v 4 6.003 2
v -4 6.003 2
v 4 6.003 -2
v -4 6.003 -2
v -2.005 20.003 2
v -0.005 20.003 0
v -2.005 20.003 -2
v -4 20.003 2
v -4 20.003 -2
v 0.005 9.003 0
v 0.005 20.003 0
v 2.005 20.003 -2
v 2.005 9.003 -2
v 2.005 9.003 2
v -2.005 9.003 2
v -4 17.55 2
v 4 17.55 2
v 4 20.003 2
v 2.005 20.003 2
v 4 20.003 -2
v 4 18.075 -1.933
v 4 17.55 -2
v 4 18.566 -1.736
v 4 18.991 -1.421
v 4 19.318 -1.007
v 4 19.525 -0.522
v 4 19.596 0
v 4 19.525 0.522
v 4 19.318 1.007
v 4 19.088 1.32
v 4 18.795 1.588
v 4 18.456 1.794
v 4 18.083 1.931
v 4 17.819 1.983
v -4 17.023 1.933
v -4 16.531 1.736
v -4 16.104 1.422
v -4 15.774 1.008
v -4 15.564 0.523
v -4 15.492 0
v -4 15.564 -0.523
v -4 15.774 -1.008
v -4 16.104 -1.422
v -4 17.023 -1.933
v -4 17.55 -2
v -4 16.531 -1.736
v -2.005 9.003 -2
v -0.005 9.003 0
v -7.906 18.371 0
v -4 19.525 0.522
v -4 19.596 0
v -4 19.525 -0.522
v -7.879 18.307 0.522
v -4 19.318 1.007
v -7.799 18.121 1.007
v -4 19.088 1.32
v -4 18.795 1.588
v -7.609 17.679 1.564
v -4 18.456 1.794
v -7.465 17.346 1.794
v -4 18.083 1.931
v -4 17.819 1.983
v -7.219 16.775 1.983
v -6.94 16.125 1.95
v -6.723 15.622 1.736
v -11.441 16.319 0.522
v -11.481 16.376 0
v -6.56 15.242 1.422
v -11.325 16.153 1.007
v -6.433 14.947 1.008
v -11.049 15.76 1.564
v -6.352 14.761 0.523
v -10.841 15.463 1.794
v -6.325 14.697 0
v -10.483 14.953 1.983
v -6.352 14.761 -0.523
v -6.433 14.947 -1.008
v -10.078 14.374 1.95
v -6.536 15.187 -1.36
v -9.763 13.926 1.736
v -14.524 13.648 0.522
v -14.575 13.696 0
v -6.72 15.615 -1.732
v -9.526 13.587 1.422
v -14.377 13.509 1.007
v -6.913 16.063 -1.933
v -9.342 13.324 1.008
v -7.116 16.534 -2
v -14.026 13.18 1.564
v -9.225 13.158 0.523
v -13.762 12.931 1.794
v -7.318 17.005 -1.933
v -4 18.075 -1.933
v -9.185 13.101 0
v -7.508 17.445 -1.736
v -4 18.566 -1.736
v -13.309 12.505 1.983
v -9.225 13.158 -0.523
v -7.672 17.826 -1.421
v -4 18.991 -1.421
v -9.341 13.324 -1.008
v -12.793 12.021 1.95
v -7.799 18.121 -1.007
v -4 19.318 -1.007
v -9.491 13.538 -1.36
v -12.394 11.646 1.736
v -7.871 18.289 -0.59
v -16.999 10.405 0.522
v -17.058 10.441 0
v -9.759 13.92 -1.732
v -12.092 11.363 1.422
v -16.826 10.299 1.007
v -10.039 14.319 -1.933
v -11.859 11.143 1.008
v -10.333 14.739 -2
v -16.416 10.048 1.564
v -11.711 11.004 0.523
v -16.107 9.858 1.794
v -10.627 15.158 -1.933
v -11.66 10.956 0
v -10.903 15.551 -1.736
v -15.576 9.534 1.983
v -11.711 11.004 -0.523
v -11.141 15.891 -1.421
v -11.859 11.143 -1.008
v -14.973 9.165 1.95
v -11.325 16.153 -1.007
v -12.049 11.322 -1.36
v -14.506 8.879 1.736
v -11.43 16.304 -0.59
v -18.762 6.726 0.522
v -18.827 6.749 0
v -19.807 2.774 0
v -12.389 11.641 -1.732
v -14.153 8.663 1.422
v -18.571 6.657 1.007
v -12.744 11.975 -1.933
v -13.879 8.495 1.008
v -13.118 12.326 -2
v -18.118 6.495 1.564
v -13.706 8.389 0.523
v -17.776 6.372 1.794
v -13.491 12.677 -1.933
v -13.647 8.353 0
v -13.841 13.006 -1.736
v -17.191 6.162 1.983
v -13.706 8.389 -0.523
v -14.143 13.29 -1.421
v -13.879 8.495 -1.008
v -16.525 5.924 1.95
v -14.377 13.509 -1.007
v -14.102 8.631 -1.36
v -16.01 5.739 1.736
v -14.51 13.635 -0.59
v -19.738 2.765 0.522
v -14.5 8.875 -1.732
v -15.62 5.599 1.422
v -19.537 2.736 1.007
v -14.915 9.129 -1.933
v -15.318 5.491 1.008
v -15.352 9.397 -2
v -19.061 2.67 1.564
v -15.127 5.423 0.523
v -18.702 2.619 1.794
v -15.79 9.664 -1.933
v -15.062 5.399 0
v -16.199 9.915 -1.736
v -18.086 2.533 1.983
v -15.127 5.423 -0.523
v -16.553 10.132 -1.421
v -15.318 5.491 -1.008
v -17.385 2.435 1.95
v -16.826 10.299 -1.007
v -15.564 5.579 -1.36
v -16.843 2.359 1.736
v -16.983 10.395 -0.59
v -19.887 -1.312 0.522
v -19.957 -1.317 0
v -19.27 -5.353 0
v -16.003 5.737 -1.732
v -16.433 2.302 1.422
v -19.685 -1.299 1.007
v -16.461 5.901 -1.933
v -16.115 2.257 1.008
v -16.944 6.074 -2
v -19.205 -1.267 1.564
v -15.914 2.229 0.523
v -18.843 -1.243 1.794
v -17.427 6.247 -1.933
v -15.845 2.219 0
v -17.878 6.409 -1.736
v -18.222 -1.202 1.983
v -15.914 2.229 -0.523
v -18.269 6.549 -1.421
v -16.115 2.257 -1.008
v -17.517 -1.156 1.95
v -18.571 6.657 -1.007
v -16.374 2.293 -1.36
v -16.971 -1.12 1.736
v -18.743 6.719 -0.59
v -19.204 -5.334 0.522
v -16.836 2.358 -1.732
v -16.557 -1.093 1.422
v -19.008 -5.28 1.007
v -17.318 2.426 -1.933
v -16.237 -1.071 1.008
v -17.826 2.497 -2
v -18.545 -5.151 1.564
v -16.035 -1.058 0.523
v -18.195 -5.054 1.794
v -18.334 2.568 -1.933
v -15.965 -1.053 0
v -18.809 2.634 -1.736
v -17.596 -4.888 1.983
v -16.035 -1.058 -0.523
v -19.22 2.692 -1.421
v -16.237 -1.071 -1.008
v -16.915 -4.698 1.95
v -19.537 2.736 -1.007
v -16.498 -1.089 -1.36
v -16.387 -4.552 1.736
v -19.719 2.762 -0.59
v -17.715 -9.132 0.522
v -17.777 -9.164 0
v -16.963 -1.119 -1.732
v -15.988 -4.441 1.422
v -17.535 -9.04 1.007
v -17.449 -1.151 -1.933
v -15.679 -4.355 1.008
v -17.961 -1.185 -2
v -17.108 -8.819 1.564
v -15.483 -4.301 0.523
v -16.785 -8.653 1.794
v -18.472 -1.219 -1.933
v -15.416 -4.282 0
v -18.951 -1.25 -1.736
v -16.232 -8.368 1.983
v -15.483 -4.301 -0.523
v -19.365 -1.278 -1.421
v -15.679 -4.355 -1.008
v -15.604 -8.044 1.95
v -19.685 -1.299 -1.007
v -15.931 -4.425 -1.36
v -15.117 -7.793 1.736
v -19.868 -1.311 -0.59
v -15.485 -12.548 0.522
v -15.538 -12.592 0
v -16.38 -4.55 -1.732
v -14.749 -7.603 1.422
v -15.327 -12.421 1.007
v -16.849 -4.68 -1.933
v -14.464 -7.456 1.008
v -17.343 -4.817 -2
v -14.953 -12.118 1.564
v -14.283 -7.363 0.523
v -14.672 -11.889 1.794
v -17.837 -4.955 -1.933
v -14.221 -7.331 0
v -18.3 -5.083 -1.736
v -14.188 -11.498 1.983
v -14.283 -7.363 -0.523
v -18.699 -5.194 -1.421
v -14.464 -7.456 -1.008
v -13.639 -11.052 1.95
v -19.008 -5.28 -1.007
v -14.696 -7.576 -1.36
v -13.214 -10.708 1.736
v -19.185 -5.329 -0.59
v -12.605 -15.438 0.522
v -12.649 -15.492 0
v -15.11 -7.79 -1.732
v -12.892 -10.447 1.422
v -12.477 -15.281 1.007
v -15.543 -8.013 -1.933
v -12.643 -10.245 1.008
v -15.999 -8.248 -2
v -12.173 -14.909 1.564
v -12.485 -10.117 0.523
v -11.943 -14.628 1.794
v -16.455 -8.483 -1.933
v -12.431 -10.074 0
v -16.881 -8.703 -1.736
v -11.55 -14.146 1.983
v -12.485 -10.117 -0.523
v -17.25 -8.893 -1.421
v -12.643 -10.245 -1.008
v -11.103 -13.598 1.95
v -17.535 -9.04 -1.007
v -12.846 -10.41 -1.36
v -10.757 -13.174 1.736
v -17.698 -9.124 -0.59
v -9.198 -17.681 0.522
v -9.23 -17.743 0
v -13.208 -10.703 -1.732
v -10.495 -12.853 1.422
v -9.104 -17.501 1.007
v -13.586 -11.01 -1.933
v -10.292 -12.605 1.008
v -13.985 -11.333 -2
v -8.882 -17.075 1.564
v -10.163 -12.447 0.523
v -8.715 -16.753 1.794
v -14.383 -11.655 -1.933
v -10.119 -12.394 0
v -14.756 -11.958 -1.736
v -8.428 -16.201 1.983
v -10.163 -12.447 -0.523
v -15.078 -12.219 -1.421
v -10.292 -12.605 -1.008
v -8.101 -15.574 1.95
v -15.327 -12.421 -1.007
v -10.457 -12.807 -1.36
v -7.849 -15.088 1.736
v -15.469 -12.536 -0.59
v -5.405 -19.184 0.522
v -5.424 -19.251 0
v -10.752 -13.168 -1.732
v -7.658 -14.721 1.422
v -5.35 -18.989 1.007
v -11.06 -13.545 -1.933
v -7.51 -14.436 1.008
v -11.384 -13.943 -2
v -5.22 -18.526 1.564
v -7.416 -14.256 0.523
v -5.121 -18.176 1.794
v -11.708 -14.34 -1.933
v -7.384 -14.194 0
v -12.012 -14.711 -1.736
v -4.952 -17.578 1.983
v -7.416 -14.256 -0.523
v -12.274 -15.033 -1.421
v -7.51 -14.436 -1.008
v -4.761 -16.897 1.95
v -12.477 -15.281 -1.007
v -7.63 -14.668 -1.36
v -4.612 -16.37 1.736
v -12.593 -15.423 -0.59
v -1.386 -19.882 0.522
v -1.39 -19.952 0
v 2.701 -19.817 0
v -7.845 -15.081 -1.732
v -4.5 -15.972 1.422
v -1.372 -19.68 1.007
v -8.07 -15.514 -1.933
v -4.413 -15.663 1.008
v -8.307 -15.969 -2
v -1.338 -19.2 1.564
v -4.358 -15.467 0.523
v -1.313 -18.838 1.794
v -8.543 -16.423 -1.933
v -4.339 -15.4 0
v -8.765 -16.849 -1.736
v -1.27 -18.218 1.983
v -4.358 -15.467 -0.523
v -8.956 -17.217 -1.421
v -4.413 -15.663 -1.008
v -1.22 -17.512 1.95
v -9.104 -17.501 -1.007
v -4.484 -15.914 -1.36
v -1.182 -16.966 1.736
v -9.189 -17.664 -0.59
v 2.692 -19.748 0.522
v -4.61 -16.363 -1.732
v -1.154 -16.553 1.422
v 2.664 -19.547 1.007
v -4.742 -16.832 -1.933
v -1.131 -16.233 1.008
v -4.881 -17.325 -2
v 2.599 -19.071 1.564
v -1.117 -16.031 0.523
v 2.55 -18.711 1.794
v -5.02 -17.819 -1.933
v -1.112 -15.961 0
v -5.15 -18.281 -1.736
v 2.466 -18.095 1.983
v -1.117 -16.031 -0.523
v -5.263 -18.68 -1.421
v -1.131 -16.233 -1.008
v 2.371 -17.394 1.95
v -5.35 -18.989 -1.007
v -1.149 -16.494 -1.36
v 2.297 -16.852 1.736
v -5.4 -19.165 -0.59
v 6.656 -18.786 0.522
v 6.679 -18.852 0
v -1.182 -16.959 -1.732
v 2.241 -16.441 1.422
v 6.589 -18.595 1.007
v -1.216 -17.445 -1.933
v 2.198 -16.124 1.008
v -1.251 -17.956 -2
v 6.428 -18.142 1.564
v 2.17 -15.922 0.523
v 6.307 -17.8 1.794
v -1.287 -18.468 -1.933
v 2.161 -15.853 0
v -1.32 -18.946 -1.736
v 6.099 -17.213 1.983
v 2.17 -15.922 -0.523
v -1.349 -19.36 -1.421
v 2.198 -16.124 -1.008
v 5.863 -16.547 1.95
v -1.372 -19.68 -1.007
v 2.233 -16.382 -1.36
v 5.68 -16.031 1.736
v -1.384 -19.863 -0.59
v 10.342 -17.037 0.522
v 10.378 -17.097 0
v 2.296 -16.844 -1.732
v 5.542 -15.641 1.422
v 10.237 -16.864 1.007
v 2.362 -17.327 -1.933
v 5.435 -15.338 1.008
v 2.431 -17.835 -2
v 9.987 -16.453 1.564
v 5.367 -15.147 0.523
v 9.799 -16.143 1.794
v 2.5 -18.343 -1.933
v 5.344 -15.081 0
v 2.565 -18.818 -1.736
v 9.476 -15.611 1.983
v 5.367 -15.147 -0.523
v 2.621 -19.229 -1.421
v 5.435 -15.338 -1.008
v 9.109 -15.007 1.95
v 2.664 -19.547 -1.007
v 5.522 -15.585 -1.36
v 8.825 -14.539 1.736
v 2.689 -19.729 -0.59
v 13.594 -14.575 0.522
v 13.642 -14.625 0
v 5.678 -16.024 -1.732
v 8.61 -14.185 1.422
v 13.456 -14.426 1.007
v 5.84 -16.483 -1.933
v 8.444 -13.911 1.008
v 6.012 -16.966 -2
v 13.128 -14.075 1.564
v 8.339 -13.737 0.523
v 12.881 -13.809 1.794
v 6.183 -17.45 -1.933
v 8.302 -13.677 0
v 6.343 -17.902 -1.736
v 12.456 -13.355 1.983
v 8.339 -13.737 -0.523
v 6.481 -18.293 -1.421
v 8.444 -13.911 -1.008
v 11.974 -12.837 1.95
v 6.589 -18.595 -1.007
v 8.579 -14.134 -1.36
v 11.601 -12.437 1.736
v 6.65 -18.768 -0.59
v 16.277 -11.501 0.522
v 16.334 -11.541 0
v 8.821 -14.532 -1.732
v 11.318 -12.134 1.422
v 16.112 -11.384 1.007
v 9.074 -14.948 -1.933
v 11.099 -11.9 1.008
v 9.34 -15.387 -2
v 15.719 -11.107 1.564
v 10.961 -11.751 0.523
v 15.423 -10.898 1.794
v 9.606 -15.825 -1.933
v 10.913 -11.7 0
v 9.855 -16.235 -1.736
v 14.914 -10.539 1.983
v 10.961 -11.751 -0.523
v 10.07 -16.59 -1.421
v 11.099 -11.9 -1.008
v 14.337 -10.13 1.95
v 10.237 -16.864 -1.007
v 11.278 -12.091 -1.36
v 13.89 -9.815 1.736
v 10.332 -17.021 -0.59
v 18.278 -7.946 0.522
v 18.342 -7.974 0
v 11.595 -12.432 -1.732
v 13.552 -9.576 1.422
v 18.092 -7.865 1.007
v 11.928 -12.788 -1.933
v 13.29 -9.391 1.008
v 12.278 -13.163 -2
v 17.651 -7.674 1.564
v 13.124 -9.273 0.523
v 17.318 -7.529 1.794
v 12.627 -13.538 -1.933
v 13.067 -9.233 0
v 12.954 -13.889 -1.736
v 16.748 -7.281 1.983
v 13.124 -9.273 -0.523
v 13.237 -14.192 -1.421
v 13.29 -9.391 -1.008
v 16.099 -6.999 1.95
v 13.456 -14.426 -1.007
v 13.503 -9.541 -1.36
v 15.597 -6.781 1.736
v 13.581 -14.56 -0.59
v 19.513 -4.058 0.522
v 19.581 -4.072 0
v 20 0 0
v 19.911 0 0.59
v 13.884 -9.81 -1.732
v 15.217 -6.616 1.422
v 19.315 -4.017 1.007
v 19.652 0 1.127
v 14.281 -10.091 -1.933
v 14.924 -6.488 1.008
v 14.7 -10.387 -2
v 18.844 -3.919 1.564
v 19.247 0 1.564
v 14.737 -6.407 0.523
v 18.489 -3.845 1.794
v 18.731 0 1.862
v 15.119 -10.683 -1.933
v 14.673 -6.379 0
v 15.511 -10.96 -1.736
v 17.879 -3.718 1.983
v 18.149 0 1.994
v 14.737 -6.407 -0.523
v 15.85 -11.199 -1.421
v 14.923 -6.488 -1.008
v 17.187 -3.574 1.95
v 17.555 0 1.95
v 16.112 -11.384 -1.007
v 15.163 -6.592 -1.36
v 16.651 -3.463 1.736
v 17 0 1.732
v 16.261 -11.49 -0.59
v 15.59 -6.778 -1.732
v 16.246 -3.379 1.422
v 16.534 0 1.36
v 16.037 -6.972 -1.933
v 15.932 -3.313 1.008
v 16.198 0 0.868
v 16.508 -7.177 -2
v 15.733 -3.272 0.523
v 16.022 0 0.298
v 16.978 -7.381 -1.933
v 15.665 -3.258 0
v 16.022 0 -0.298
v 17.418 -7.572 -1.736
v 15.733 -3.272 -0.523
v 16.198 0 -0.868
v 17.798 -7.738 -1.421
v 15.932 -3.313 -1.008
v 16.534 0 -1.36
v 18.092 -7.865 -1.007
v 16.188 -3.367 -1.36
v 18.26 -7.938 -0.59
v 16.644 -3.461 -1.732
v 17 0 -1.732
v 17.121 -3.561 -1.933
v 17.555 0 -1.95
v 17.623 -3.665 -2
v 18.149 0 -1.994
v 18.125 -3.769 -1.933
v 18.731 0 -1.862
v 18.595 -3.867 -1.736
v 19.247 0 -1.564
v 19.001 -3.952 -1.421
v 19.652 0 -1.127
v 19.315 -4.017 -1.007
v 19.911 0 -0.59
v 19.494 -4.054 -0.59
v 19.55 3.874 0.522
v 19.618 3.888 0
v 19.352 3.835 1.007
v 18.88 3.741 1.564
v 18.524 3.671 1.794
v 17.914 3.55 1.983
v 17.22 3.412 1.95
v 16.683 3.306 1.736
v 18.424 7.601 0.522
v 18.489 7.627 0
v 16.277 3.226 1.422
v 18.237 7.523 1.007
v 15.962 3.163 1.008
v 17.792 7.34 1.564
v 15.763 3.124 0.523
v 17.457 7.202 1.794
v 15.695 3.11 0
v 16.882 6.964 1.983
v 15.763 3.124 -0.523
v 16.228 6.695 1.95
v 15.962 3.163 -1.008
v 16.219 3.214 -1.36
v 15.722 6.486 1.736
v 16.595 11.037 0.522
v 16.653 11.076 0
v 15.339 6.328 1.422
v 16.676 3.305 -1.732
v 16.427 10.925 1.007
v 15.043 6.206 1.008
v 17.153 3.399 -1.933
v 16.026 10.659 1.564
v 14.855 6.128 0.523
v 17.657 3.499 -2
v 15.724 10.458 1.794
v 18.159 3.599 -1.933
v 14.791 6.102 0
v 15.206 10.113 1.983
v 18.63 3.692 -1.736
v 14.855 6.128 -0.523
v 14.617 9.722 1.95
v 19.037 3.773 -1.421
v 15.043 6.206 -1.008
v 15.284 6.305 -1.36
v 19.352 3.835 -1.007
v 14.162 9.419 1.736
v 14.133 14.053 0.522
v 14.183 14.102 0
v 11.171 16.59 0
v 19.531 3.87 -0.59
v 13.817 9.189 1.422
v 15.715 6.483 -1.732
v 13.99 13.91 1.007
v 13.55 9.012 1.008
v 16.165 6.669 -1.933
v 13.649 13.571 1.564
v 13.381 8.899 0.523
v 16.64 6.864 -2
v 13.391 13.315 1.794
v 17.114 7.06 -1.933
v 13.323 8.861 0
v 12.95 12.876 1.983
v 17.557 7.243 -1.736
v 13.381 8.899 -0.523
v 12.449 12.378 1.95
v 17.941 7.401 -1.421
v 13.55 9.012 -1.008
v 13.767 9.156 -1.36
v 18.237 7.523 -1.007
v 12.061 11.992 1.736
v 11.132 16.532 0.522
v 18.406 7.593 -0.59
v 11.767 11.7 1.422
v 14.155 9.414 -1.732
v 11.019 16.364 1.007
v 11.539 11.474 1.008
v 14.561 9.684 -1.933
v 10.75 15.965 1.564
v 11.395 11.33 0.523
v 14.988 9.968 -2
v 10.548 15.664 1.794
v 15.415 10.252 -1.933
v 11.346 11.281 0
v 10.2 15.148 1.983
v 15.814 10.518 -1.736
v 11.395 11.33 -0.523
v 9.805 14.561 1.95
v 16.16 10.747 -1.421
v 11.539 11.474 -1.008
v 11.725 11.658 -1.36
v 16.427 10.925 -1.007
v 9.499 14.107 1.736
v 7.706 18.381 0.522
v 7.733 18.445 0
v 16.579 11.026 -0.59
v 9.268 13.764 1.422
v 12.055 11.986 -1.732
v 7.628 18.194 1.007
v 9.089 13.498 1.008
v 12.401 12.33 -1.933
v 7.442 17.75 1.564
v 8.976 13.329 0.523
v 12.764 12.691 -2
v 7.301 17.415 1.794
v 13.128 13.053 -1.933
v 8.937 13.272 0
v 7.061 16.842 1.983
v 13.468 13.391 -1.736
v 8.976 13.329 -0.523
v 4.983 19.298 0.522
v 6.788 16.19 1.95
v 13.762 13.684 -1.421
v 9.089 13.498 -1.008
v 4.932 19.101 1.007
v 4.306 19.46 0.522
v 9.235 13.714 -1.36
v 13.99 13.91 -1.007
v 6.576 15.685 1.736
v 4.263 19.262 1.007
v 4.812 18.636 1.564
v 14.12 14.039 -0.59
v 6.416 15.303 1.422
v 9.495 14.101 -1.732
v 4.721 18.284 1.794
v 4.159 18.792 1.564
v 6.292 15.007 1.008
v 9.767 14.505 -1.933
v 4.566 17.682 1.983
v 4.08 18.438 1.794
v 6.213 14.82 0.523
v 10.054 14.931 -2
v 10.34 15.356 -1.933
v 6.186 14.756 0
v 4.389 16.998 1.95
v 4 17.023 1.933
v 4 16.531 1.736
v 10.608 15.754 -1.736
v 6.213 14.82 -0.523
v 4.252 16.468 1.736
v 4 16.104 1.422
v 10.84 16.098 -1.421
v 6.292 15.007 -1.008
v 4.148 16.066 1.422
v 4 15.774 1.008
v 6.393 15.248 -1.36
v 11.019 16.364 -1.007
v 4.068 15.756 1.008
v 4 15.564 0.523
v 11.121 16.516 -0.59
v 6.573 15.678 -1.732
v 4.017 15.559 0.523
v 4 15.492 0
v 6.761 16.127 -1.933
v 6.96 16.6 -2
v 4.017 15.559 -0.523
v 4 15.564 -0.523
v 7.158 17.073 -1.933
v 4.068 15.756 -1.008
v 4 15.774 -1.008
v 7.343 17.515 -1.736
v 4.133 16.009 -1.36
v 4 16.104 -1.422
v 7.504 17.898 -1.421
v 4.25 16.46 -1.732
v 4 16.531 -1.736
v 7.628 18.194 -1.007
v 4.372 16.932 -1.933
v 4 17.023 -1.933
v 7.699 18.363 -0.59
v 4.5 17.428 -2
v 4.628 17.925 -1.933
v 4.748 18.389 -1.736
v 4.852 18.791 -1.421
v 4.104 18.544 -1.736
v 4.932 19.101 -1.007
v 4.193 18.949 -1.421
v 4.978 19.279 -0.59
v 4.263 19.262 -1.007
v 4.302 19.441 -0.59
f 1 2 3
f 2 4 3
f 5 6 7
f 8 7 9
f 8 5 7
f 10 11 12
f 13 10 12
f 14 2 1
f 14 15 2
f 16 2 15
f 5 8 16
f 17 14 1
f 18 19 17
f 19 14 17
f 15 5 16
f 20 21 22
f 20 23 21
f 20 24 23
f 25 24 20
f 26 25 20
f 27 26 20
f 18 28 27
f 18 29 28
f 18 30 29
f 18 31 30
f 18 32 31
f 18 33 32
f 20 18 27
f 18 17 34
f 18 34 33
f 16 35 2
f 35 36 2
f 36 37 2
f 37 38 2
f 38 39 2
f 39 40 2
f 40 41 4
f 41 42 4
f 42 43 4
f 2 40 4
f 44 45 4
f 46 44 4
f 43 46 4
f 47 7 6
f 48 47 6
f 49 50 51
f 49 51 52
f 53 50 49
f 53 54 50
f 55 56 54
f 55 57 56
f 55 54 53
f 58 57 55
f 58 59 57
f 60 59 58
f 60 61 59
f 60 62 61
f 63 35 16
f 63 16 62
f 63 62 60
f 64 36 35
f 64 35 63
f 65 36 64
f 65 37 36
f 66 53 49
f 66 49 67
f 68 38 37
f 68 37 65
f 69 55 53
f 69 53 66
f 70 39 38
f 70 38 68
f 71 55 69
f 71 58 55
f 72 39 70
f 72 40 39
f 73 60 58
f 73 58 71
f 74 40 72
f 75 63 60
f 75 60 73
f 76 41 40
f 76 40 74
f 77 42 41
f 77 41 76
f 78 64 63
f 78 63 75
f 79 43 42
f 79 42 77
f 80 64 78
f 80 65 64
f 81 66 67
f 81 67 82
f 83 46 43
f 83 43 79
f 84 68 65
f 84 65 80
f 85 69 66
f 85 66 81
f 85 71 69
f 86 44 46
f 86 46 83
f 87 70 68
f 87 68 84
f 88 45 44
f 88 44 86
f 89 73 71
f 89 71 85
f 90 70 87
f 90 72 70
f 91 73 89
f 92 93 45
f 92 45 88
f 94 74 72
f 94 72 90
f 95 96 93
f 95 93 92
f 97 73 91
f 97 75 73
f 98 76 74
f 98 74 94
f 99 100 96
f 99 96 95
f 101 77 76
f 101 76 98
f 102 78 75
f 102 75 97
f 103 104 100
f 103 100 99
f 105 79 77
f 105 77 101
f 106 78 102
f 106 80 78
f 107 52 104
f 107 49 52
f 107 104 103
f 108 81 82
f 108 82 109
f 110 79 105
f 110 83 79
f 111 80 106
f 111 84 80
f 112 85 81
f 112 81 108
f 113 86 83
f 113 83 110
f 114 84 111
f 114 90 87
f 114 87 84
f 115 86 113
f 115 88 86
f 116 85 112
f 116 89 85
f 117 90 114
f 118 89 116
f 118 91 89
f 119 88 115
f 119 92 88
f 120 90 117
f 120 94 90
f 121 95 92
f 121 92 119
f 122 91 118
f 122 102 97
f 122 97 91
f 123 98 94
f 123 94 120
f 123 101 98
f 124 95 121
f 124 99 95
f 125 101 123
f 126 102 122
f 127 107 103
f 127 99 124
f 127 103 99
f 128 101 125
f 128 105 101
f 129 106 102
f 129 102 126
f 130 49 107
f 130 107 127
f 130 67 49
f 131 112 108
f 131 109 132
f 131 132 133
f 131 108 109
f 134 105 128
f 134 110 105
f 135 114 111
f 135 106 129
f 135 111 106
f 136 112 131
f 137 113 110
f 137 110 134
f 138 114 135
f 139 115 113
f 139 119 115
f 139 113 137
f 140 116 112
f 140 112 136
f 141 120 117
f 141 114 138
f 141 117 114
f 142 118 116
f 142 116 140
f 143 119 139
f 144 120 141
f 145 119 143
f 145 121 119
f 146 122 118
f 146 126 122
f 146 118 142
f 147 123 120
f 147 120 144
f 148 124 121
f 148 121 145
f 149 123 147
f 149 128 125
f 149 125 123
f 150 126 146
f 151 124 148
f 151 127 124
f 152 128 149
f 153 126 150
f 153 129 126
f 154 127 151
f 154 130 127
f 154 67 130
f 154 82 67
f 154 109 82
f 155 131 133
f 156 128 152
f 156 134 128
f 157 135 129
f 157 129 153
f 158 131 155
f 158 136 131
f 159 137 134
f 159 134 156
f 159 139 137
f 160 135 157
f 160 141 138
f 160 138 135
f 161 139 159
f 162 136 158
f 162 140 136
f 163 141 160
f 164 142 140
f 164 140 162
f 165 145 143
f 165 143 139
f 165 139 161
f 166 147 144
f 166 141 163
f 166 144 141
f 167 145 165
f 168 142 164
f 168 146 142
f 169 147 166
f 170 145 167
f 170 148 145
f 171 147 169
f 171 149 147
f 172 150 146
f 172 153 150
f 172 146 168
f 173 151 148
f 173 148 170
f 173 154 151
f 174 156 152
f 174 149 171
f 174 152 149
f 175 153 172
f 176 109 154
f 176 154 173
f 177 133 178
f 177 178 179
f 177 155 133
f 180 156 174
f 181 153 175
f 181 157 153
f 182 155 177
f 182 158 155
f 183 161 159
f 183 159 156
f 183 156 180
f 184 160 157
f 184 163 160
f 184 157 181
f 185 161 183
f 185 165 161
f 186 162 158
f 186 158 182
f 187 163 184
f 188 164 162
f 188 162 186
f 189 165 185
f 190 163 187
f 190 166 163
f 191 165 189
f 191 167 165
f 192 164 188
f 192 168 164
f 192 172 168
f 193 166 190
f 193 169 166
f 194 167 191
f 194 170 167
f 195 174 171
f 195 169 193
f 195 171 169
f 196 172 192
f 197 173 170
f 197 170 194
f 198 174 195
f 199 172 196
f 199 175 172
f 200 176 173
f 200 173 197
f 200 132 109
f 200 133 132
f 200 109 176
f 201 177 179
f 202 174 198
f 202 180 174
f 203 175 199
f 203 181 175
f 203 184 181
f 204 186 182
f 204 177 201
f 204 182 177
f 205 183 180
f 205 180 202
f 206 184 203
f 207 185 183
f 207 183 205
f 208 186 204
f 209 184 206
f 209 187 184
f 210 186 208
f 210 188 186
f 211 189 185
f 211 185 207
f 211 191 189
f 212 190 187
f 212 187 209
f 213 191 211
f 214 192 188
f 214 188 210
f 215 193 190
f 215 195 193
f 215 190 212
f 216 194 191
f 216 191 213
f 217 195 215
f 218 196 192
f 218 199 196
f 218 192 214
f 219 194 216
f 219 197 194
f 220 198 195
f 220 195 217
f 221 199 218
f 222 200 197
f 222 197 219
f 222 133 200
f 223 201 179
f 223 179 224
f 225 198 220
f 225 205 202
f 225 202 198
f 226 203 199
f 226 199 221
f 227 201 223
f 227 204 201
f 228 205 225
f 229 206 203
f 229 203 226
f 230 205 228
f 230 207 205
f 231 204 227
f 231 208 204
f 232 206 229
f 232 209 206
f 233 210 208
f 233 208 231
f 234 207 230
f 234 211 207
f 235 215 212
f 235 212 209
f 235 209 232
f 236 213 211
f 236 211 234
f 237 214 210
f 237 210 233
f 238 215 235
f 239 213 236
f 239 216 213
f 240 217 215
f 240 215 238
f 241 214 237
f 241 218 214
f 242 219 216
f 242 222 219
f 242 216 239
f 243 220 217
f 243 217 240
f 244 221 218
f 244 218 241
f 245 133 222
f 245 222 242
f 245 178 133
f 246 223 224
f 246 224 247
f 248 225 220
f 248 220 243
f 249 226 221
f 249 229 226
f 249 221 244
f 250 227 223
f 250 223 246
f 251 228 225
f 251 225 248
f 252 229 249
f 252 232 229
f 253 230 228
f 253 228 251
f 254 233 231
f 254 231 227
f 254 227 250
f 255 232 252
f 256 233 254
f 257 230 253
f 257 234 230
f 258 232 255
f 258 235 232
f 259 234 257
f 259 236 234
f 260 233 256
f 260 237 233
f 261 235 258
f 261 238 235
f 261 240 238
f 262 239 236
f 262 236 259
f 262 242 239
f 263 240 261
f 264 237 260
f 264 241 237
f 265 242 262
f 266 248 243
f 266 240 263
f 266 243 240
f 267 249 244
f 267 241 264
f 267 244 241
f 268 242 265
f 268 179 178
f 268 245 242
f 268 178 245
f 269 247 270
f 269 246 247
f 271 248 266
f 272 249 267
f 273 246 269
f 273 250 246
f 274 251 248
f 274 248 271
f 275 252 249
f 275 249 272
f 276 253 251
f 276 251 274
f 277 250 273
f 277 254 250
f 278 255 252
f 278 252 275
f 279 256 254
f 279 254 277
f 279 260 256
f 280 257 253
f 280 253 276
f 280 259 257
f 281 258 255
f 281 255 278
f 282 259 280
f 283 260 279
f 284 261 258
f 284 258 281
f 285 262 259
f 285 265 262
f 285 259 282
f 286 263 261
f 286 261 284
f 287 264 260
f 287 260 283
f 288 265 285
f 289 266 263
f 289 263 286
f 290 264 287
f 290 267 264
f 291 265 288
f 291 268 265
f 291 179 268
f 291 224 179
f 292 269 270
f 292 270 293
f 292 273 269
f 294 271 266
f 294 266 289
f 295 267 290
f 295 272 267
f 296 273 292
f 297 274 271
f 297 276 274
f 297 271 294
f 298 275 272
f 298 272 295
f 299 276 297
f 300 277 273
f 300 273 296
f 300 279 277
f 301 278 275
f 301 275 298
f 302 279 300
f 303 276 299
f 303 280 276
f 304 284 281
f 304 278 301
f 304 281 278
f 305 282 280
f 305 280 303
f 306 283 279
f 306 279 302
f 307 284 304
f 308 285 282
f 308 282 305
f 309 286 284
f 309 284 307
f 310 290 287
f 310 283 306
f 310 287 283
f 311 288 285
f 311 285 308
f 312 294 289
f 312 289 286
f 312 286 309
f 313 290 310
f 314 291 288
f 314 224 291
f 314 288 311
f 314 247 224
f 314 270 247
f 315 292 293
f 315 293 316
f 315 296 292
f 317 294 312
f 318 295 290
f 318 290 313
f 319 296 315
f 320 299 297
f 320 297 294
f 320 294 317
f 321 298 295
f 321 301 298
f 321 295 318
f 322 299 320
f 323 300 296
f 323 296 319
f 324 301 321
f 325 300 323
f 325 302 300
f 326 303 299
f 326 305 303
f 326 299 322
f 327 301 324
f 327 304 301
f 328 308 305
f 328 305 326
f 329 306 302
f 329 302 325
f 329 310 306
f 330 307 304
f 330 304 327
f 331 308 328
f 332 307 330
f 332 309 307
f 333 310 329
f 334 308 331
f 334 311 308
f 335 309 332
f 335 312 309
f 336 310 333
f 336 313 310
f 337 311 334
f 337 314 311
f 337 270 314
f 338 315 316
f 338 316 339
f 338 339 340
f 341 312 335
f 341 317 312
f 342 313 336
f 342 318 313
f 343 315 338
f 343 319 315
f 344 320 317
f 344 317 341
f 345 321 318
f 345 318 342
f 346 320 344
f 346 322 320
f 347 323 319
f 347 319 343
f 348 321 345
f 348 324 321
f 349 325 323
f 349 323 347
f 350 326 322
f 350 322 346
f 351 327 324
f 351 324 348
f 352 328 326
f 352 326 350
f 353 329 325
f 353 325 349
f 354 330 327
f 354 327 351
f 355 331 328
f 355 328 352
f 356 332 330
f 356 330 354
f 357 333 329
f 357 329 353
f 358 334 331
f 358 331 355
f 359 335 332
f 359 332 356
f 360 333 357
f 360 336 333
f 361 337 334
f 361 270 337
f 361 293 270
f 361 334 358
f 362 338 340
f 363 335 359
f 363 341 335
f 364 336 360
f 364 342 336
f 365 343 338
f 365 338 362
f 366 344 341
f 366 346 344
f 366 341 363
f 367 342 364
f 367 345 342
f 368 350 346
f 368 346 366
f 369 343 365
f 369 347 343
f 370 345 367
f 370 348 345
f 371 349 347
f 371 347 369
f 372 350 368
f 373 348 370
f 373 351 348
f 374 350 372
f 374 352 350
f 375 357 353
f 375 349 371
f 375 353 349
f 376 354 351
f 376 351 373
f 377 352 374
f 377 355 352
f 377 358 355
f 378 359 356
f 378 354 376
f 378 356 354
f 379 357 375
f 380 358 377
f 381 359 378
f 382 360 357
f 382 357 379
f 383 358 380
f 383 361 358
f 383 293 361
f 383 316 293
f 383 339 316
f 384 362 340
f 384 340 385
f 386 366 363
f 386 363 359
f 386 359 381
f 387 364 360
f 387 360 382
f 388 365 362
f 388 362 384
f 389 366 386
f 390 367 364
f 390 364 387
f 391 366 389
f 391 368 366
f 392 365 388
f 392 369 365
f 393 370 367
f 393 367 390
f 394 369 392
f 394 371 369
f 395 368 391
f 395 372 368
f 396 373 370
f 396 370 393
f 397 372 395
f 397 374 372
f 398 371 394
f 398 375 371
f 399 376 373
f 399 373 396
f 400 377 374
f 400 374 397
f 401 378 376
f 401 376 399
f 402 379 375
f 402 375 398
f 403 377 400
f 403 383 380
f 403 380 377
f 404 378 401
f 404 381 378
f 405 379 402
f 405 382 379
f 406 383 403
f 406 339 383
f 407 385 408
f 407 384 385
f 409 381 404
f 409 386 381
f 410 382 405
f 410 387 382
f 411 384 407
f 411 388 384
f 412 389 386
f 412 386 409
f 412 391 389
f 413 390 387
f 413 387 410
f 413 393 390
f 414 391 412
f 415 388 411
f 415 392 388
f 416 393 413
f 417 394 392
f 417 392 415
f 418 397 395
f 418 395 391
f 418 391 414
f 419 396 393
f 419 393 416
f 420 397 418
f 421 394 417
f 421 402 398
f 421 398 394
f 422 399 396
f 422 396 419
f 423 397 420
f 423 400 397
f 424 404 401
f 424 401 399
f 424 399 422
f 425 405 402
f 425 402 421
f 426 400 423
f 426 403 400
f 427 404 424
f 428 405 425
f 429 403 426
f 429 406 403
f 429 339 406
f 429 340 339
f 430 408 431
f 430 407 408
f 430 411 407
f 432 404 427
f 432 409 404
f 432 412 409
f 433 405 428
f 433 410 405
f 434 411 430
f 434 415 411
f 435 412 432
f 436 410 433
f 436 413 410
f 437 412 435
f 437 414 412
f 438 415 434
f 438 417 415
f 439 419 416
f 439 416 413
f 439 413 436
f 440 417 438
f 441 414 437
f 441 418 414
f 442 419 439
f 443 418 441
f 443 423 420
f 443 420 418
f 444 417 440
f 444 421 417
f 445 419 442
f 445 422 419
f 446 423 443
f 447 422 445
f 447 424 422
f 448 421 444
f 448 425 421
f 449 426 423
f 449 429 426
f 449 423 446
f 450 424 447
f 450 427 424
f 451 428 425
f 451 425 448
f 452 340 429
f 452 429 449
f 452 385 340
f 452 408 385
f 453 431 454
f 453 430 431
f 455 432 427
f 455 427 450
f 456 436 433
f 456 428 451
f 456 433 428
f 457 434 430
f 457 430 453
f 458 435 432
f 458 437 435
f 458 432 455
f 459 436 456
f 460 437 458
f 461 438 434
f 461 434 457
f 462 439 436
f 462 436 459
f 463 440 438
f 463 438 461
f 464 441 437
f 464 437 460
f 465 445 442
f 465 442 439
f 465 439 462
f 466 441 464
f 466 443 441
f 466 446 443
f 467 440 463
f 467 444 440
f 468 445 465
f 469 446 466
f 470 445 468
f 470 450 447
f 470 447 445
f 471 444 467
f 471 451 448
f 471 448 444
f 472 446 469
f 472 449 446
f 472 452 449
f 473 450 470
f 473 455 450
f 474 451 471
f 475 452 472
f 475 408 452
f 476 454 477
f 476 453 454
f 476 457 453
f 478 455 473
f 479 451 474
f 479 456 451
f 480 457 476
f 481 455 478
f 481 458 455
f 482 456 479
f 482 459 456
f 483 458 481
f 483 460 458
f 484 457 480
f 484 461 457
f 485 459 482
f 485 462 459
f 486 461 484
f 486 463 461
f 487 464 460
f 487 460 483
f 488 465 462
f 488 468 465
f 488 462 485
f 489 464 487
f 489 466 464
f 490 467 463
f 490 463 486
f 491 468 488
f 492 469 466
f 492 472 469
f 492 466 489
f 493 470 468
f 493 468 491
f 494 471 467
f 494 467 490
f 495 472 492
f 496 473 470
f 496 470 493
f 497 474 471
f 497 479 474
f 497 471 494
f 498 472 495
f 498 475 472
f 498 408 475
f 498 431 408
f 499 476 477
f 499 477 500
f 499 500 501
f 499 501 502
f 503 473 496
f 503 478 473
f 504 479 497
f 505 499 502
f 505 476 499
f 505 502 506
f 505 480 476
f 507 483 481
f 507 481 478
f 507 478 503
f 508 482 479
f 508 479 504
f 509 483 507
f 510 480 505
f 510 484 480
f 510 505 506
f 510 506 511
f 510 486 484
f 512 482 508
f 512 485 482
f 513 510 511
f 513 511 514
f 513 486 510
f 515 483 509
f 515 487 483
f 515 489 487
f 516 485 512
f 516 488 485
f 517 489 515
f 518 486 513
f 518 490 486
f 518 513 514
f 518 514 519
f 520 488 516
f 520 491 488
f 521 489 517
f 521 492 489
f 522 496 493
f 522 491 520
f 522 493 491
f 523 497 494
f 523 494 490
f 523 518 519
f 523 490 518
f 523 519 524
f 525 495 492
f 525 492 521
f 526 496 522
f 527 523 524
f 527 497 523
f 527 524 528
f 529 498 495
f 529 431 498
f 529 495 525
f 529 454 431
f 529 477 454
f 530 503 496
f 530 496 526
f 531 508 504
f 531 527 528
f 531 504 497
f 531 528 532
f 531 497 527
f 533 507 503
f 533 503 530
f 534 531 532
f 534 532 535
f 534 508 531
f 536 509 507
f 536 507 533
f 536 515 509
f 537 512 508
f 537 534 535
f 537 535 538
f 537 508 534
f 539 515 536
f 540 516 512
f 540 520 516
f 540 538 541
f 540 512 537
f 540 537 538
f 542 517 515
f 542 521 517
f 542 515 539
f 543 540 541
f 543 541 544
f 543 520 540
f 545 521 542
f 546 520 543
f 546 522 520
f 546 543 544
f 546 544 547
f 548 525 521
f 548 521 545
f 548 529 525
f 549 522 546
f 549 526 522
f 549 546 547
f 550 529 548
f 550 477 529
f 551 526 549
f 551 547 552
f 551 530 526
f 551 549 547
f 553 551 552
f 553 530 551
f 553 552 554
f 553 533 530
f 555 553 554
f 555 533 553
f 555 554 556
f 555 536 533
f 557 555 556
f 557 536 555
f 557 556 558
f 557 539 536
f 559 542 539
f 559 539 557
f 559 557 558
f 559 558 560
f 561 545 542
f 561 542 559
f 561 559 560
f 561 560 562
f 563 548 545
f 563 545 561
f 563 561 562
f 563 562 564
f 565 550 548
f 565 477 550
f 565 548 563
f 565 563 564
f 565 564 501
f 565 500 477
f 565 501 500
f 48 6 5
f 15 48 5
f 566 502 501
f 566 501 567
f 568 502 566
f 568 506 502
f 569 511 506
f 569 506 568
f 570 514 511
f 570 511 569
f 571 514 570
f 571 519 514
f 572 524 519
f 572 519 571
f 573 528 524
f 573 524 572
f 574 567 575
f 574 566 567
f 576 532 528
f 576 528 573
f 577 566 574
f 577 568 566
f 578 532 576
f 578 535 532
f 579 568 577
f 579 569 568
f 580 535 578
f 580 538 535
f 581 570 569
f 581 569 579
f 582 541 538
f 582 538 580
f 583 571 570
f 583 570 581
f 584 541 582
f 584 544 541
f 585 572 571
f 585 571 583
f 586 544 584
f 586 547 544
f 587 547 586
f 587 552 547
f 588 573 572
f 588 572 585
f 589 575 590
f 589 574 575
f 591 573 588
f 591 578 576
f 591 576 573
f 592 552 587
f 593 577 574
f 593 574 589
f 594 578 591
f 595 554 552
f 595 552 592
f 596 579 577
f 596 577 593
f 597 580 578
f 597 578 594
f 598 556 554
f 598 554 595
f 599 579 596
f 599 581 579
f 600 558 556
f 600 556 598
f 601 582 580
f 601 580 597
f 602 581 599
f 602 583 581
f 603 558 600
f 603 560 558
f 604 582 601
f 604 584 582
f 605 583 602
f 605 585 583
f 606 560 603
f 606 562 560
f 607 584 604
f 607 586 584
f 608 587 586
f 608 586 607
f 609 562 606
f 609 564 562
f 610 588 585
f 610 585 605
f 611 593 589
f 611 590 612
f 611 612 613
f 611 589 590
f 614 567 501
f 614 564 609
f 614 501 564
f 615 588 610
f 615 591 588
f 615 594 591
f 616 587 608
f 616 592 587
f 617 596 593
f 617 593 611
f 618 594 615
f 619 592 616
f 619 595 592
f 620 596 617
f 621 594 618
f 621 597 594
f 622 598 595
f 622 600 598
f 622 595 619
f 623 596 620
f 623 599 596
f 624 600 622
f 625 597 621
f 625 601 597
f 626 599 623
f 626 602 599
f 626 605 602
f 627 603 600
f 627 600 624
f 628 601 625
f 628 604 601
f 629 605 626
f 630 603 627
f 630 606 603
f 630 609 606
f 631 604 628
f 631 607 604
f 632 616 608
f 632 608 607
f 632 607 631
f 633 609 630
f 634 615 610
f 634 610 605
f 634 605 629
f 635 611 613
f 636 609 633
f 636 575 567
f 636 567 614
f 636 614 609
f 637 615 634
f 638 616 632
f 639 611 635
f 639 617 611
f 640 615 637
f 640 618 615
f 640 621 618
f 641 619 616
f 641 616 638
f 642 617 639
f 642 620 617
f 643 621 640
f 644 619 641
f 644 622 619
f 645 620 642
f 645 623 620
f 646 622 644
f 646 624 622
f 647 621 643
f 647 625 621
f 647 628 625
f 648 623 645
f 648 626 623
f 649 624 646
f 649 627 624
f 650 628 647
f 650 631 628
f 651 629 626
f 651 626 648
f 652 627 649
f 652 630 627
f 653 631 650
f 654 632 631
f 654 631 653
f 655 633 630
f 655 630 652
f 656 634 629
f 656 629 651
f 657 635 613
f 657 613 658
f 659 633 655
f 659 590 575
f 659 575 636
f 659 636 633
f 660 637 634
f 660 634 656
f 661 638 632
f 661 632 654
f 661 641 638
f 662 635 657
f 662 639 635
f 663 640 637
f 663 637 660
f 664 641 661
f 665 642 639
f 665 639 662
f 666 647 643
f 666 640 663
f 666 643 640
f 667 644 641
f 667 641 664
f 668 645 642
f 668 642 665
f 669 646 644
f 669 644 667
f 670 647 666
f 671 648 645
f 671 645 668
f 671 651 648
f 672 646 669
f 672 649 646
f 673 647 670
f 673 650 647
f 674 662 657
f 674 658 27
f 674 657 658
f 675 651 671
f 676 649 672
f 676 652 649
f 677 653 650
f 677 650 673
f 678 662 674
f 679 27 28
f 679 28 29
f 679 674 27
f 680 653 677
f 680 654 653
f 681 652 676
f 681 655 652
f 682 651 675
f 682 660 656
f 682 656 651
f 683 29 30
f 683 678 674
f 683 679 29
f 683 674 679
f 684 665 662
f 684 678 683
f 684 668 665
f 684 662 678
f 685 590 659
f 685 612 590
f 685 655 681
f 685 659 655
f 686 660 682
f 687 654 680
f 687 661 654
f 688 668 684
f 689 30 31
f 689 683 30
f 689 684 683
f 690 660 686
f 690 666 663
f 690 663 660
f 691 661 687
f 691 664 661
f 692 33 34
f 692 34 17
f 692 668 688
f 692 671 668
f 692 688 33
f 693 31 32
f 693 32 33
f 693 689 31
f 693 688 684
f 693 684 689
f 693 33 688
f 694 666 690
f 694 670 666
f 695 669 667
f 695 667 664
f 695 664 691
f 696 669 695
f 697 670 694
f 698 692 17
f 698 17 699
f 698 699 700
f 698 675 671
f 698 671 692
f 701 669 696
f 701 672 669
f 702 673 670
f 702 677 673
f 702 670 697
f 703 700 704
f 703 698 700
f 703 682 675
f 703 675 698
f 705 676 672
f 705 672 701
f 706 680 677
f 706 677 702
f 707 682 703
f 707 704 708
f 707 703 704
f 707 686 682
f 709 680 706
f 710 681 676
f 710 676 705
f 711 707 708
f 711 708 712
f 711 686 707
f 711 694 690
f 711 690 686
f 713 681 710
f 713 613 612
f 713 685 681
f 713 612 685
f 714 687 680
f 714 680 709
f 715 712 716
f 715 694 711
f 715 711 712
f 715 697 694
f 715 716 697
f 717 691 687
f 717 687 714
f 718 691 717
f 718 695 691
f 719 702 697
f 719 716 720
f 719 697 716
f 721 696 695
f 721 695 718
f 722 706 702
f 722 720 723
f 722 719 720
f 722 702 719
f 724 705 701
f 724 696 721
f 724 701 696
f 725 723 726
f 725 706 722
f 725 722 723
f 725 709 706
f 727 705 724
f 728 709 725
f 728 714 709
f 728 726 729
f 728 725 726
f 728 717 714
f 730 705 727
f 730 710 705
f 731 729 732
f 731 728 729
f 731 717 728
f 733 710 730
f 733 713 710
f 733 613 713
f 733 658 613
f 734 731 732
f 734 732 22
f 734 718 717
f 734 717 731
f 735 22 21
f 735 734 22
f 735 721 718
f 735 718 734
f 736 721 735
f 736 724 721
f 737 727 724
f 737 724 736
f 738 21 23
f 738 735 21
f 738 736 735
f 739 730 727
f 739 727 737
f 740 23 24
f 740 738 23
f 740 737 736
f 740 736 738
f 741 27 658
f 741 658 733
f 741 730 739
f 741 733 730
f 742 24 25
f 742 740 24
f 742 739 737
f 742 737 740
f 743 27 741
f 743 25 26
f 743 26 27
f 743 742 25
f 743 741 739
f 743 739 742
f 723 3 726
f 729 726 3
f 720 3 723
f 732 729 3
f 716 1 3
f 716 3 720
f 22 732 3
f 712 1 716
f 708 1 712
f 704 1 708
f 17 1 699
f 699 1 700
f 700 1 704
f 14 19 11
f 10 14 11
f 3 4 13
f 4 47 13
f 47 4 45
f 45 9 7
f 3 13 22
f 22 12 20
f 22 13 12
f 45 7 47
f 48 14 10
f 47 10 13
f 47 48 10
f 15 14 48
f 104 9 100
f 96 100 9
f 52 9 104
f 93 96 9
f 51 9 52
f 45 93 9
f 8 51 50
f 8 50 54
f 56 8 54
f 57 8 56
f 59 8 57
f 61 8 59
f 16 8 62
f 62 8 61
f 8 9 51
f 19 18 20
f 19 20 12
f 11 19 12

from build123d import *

# Parameters (mm, degrees)
F1_R          = 2
F4_DEPTH      = 2
F4_DEPTH_BACK = 2
F6_DEPTH      = 11


with BuildPart() as f2:
    # F1 (on Front) → F2 (revolve)
    with BuildSketch(Plane.XZ):
        with Locations((18, 0)):
            Circle(F1_R)
    revolve(axis=Axis((0, 0, 0), (0, 0, 1)))

    # F3 (on face) → F4 (join, two sides)
    with BuildSketch(Plane.XY) as f4_sk:
        Polygon((4, 20.003311336), (0, 20.003311336), (-4, 20.003311336), (-4, 6.003311336), (0, 6.003311336), (4, 6.003311336), align=None)
    extrude(amount=F4_DEPTH)
    extrude(f4_sk.sketch, amount=-F4_DEPTH_BACK)

    # F5 (on face) → F6 (cut)
    with BuildSketch(Plane(origin=(0, 20.003311336, 0), x_dir=(-1, 0, 0), z_dir=(0, 1, 0))):
        Polygon((-0.005, 0), (-2.005, -2), (2.005, -2), (0.005, 0), (2.005, 2), (-2.005, 2), align=None)
    extrude(amount=-F6_DEPTH, mode=Mode.SUBTRACT)


solid = f2.part
